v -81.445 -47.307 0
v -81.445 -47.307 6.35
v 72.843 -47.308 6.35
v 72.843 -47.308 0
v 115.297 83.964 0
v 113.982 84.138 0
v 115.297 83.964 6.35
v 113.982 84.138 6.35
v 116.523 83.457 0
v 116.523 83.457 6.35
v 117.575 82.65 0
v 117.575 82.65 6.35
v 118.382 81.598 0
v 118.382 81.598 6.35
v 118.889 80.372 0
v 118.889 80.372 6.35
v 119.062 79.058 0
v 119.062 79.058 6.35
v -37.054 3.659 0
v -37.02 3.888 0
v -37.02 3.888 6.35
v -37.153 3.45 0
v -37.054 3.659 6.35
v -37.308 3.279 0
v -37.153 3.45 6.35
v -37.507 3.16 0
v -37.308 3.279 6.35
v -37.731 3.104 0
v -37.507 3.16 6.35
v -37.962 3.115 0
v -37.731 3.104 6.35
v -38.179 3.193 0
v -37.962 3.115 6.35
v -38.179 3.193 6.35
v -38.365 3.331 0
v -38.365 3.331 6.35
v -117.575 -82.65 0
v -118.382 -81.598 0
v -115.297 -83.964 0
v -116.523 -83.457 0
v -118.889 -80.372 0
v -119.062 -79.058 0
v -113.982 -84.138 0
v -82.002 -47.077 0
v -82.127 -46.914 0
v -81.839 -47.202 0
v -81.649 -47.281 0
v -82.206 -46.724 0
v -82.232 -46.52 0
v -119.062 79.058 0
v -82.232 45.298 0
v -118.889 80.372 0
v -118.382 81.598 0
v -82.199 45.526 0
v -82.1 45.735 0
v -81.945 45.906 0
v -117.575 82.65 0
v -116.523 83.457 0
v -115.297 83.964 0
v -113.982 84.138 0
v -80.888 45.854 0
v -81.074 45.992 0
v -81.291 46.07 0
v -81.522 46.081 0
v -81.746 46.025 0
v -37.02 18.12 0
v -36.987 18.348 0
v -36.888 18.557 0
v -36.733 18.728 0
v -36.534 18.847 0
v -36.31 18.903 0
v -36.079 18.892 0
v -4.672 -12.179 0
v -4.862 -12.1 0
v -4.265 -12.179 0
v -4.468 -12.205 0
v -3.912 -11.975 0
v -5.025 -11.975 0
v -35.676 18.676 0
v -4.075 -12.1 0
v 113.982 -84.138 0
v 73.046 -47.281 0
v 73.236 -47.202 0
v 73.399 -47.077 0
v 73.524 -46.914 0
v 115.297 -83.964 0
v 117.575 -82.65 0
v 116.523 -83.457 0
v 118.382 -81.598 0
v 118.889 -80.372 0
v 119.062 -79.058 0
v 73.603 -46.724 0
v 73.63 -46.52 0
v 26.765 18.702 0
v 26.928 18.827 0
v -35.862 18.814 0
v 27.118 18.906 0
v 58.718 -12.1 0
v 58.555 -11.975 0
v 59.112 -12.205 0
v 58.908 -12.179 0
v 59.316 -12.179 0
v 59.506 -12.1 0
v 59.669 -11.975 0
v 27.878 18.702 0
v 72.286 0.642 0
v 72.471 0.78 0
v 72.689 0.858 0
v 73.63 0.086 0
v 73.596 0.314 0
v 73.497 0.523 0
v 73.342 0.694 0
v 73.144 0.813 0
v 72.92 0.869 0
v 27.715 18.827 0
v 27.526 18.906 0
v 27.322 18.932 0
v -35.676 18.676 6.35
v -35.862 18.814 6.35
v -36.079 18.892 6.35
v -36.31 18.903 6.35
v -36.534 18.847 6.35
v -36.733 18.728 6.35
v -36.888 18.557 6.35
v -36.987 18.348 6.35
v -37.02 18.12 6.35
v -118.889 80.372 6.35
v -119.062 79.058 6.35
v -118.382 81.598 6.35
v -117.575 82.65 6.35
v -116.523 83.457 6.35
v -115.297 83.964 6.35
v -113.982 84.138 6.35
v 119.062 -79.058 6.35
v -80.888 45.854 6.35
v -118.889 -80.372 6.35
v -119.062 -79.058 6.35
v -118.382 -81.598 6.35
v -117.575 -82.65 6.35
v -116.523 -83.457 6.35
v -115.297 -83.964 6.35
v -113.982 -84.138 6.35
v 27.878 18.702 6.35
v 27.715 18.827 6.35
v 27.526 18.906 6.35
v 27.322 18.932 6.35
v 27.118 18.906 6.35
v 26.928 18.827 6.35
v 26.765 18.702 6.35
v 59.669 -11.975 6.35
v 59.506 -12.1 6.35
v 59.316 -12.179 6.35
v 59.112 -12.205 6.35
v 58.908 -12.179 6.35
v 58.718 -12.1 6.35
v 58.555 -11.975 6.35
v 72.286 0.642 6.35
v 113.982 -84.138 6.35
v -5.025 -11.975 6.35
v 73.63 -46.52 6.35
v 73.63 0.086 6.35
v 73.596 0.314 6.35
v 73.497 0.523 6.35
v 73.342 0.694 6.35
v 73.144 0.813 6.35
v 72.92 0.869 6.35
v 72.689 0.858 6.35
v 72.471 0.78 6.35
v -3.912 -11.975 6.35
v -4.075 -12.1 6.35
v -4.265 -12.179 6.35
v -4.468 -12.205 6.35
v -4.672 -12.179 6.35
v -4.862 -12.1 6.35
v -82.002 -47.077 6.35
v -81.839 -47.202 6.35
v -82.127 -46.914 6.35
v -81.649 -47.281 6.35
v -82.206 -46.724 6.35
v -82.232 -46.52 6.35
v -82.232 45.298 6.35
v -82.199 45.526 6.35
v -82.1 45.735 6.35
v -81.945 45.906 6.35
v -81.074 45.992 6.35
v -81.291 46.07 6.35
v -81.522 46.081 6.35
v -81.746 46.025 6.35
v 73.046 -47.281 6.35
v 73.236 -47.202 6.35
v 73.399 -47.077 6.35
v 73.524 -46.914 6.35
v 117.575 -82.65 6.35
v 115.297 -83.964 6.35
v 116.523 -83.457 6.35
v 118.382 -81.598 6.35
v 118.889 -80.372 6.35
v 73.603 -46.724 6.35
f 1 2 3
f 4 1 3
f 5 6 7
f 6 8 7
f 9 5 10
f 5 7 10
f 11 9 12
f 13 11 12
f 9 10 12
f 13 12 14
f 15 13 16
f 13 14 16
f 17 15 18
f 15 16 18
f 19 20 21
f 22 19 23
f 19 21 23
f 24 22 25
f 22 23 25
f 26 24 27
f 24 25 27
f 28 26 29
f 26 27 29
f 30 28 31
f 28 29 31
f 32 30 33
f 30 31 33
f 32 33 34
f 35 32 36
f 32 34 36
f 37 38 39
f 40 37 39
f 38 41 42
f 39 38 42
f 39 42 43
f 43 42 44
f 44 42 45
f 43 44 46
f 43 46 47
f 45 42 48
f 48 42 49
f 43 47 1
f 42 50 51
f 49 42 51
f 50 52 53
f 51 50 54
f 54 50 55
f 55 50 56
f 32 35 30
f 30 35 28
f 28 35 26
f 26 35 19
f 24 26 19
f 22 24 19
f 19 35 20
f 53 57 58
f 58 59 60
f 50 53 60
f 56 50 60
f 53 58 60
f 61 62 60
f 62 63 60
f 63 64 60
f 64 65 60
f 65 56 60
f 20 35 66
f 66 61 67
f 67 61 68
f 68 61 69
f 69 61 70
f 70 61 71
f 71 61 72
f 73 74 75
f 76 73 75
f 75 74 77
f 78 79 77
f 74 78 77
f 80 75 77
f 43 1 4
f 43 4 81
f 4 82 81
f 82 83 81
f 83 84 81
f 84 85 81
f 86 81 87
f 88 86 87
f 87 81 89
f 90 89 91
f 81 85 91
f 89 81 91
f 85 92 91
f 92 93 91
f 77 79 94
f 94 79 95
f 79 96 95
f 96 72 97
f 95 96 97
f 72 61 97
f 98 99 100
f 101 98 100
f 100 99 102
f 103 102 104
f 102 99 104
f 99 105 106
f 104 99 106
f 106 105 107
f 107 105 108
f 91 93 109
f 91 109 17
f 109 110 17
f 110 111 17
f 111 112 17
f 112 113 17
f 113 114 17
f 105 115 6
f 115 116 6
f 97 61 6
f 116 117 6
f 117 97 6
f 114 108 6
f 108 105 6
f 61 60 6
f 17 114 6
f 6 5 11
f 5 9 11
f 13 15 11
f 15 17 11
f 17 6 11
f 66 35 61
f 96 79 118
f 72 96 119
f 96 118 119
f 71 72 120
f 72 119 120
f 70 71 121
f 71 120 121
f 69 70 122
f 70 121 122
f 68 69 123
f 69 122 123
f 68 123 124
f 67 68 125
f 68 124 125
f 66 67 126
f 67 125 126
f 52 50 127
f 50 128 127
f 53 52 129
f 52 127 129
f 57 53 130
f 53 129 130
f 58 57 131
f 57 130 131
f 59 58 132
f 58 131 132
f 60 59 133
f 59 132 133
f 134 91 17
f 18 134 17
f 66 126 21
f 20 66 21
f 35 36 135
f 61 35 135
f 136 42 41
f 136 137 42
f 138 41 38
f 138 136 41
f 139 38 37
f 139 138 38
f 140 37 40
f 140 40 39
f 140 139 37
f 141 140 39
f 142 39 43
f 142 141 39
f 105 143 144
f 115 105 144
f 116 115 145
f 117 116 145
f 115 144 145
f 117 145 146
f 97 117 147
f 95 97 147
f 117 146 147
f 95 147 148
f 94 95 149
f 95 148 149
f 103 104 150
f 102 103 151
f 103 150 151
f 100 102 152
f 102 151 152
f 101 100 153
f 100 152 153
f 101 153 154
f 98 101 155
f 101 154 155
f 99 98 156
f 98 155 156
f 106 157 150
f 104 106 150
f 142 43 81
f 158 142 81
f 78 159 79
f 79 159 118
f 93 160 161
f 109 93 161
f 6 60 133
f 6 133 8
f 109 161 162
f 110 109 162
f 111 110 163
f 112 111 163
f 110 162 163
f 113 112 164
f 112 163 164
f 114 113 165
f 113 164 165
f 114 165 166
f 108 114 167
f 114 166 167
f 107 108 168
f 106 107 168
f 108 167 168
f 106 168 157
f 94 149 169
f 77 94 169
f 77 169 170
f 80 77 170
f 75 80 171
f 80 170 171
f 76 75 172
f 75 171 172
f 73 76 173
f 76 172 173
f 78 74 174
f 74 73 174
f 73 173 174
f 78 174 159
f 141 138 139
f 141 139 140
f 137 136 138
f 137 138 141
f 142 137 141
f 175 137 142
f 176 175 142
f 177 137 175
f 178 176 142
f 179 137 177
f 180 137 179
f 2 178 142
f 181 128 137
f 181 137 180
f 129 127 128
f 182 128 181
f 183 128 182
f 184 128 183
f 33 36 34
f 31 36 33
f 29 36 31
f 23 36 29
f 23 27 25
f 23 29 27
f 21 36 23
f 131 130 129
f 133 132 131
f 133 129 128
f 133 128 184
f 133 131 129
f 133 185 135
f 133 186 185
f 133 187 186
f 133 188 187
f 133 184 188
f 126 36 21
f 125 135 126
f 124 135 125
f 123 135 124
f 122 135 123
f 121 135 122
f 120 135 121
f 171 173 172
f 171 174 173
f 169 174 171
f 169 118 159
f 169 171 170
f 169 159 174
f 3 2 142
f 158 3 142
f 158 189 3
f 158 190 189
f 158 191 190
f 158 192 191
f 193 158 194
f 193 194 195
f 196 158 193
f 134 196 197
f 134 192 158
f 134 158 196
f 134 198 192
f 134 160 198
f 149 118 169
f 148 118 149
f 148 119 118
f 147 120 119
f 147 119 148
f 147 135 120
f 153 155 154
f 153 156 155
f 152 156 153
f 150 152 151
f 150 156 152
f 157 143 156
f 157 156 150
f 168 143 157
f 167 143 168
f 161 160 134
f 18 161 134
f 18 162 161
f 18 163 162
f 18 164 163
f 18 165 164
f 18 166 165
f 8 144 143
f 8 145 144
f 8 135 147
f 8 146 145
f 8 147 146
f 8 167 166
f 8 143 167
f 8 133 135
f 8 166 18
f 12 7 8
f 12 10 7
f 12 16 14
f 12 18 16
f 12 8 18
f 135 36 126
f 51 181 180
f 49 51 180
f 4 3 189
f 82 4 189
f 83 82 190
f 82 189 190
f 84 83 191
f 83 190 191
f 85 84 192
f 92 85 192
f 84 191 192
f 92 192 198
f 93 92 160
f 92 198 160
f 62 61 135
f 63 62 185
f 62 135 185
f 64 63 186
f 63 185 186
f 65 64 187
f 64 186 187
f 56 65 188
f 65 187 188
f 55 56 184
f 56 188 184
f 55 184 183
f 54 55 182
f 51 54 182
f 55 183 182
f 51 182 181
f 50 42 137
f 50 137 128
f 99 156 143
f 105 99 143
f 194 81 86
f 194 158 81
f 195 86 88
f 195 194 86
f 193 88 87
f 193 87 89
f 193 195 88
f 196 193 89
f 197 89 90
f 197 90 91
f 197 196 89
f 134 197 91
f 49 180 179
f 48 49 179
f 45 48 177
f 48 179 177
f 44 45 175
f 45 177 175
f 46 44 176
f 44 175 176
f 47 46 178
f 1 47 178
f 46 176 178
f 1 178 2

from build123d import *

# Parameters (mm, degrees)
F0_W     = 238.125
F0_H     = 168.275
F1_DEPTH = 6.35
F3_DEPTH = 25.4
F5_DEPTH = 25.4
F6_R     = 5.08


with BuildPart() as f1:
    # F0 (on Top) → F1 (new body)
    with BuildSketch(Plane.XY):
        Rectangle(F0_W, F0_H)
    extrude(amount=F1_DEPTH)

    # F2 (on face) → F3 (cut)
    with BuildSketch(Plane.XY.offset(6.35)):
        Polygon((-35.7505, -1.0795), (-80.9625, 44.1325), (-80.9625, -46.0375), (72.359927, -46.0375), (72.359927, -1.0795), (59.11182, -14.327607), (27.321713, 17.4625), (-4.468393, -14.327607), (-35.7505, 16.9545), align=None)
    extrude(amount=-F3_DEPTH, mode=Mode.SUBTRACT)

    # F4 (on face) → F5 (cut)
    with BuildSketch(Plane.XY.offset(6.35)):
        with BuildLine():
            ThreePointArc((-35.676324, 18.676375), (-36.534425, 18.847062), (-37.0205, 18.119599))
            Line((-37.0205, 18.119599), (-37.0205, 3.887503))
            ThreePointArc((-37.0205, 3.887503), (-37.506575, 3.16004), (-38.364676, 3.330727))
            Line((-38.364676, 3.330727), (-80.888324, 45.854375))
            ThreePointArc((-80.888324, 45.854375), (-81.746425, 46.025062), (-82.2325, 45.297599))
            Line((-82.2325, 45.297599), (-82.2325, -46.5201))
            ThreePointArc((-82.2325, -46.5201), (-82.001876, -47.076876), (-81.4451, -47.3075))
            Line((-81.4451, -47.3075), (72.842527, -47.3075))
            ThreePointArc((72.842527, -47.3075), (73.399303, -47.076876), (73.629927, -46.5201))
            Line((73.629927, -46.5201), (73.629927, 0.085599))
            ThreePointArc((73.629927, 0.085599), (73.143852, 0.813062), (72.285751, 0.642375))
            Line((72.285751, 0.642375), (59.668596, -11.97478))
            ThreePointArc((59.668596, -11.97478), (59.11182, -12.205404), (58.555044, -11.97478))
            Line((58.555044, -11.97478), (27.878489, 18.701775))
            ThreePointArc((27.878489, 18.701775), (27.321713, 18.932399), (26.764937, 18.701775))
            Line((26.764937, 18.701775), (-3.911617, -11.97478))
            ThreePointArc((-3.911617, -11.97478), (-4.468393, -12.205404), (-5.025169, -11.97478))
            Line((-5.025169, -11.97478), (-35.676324, 18.676375))
        make_face()
    extrude(amount=-F5_DEPTH, mode=Mode.SUBTRACT)

    # F6
    f6_edges = [f1.edges().sort_by_distance(p)[0] for p in [
        (119.0625, 84.1375, 3.175),
        (119.0625, -84.1375, 3.175),
        (-119.0625, 84.1375, 3.175),
        (-119.0625, -84.1375, 3.175),
    ]]
    fillet(f6_edges, radius=F6_R)


solid = f1.part
